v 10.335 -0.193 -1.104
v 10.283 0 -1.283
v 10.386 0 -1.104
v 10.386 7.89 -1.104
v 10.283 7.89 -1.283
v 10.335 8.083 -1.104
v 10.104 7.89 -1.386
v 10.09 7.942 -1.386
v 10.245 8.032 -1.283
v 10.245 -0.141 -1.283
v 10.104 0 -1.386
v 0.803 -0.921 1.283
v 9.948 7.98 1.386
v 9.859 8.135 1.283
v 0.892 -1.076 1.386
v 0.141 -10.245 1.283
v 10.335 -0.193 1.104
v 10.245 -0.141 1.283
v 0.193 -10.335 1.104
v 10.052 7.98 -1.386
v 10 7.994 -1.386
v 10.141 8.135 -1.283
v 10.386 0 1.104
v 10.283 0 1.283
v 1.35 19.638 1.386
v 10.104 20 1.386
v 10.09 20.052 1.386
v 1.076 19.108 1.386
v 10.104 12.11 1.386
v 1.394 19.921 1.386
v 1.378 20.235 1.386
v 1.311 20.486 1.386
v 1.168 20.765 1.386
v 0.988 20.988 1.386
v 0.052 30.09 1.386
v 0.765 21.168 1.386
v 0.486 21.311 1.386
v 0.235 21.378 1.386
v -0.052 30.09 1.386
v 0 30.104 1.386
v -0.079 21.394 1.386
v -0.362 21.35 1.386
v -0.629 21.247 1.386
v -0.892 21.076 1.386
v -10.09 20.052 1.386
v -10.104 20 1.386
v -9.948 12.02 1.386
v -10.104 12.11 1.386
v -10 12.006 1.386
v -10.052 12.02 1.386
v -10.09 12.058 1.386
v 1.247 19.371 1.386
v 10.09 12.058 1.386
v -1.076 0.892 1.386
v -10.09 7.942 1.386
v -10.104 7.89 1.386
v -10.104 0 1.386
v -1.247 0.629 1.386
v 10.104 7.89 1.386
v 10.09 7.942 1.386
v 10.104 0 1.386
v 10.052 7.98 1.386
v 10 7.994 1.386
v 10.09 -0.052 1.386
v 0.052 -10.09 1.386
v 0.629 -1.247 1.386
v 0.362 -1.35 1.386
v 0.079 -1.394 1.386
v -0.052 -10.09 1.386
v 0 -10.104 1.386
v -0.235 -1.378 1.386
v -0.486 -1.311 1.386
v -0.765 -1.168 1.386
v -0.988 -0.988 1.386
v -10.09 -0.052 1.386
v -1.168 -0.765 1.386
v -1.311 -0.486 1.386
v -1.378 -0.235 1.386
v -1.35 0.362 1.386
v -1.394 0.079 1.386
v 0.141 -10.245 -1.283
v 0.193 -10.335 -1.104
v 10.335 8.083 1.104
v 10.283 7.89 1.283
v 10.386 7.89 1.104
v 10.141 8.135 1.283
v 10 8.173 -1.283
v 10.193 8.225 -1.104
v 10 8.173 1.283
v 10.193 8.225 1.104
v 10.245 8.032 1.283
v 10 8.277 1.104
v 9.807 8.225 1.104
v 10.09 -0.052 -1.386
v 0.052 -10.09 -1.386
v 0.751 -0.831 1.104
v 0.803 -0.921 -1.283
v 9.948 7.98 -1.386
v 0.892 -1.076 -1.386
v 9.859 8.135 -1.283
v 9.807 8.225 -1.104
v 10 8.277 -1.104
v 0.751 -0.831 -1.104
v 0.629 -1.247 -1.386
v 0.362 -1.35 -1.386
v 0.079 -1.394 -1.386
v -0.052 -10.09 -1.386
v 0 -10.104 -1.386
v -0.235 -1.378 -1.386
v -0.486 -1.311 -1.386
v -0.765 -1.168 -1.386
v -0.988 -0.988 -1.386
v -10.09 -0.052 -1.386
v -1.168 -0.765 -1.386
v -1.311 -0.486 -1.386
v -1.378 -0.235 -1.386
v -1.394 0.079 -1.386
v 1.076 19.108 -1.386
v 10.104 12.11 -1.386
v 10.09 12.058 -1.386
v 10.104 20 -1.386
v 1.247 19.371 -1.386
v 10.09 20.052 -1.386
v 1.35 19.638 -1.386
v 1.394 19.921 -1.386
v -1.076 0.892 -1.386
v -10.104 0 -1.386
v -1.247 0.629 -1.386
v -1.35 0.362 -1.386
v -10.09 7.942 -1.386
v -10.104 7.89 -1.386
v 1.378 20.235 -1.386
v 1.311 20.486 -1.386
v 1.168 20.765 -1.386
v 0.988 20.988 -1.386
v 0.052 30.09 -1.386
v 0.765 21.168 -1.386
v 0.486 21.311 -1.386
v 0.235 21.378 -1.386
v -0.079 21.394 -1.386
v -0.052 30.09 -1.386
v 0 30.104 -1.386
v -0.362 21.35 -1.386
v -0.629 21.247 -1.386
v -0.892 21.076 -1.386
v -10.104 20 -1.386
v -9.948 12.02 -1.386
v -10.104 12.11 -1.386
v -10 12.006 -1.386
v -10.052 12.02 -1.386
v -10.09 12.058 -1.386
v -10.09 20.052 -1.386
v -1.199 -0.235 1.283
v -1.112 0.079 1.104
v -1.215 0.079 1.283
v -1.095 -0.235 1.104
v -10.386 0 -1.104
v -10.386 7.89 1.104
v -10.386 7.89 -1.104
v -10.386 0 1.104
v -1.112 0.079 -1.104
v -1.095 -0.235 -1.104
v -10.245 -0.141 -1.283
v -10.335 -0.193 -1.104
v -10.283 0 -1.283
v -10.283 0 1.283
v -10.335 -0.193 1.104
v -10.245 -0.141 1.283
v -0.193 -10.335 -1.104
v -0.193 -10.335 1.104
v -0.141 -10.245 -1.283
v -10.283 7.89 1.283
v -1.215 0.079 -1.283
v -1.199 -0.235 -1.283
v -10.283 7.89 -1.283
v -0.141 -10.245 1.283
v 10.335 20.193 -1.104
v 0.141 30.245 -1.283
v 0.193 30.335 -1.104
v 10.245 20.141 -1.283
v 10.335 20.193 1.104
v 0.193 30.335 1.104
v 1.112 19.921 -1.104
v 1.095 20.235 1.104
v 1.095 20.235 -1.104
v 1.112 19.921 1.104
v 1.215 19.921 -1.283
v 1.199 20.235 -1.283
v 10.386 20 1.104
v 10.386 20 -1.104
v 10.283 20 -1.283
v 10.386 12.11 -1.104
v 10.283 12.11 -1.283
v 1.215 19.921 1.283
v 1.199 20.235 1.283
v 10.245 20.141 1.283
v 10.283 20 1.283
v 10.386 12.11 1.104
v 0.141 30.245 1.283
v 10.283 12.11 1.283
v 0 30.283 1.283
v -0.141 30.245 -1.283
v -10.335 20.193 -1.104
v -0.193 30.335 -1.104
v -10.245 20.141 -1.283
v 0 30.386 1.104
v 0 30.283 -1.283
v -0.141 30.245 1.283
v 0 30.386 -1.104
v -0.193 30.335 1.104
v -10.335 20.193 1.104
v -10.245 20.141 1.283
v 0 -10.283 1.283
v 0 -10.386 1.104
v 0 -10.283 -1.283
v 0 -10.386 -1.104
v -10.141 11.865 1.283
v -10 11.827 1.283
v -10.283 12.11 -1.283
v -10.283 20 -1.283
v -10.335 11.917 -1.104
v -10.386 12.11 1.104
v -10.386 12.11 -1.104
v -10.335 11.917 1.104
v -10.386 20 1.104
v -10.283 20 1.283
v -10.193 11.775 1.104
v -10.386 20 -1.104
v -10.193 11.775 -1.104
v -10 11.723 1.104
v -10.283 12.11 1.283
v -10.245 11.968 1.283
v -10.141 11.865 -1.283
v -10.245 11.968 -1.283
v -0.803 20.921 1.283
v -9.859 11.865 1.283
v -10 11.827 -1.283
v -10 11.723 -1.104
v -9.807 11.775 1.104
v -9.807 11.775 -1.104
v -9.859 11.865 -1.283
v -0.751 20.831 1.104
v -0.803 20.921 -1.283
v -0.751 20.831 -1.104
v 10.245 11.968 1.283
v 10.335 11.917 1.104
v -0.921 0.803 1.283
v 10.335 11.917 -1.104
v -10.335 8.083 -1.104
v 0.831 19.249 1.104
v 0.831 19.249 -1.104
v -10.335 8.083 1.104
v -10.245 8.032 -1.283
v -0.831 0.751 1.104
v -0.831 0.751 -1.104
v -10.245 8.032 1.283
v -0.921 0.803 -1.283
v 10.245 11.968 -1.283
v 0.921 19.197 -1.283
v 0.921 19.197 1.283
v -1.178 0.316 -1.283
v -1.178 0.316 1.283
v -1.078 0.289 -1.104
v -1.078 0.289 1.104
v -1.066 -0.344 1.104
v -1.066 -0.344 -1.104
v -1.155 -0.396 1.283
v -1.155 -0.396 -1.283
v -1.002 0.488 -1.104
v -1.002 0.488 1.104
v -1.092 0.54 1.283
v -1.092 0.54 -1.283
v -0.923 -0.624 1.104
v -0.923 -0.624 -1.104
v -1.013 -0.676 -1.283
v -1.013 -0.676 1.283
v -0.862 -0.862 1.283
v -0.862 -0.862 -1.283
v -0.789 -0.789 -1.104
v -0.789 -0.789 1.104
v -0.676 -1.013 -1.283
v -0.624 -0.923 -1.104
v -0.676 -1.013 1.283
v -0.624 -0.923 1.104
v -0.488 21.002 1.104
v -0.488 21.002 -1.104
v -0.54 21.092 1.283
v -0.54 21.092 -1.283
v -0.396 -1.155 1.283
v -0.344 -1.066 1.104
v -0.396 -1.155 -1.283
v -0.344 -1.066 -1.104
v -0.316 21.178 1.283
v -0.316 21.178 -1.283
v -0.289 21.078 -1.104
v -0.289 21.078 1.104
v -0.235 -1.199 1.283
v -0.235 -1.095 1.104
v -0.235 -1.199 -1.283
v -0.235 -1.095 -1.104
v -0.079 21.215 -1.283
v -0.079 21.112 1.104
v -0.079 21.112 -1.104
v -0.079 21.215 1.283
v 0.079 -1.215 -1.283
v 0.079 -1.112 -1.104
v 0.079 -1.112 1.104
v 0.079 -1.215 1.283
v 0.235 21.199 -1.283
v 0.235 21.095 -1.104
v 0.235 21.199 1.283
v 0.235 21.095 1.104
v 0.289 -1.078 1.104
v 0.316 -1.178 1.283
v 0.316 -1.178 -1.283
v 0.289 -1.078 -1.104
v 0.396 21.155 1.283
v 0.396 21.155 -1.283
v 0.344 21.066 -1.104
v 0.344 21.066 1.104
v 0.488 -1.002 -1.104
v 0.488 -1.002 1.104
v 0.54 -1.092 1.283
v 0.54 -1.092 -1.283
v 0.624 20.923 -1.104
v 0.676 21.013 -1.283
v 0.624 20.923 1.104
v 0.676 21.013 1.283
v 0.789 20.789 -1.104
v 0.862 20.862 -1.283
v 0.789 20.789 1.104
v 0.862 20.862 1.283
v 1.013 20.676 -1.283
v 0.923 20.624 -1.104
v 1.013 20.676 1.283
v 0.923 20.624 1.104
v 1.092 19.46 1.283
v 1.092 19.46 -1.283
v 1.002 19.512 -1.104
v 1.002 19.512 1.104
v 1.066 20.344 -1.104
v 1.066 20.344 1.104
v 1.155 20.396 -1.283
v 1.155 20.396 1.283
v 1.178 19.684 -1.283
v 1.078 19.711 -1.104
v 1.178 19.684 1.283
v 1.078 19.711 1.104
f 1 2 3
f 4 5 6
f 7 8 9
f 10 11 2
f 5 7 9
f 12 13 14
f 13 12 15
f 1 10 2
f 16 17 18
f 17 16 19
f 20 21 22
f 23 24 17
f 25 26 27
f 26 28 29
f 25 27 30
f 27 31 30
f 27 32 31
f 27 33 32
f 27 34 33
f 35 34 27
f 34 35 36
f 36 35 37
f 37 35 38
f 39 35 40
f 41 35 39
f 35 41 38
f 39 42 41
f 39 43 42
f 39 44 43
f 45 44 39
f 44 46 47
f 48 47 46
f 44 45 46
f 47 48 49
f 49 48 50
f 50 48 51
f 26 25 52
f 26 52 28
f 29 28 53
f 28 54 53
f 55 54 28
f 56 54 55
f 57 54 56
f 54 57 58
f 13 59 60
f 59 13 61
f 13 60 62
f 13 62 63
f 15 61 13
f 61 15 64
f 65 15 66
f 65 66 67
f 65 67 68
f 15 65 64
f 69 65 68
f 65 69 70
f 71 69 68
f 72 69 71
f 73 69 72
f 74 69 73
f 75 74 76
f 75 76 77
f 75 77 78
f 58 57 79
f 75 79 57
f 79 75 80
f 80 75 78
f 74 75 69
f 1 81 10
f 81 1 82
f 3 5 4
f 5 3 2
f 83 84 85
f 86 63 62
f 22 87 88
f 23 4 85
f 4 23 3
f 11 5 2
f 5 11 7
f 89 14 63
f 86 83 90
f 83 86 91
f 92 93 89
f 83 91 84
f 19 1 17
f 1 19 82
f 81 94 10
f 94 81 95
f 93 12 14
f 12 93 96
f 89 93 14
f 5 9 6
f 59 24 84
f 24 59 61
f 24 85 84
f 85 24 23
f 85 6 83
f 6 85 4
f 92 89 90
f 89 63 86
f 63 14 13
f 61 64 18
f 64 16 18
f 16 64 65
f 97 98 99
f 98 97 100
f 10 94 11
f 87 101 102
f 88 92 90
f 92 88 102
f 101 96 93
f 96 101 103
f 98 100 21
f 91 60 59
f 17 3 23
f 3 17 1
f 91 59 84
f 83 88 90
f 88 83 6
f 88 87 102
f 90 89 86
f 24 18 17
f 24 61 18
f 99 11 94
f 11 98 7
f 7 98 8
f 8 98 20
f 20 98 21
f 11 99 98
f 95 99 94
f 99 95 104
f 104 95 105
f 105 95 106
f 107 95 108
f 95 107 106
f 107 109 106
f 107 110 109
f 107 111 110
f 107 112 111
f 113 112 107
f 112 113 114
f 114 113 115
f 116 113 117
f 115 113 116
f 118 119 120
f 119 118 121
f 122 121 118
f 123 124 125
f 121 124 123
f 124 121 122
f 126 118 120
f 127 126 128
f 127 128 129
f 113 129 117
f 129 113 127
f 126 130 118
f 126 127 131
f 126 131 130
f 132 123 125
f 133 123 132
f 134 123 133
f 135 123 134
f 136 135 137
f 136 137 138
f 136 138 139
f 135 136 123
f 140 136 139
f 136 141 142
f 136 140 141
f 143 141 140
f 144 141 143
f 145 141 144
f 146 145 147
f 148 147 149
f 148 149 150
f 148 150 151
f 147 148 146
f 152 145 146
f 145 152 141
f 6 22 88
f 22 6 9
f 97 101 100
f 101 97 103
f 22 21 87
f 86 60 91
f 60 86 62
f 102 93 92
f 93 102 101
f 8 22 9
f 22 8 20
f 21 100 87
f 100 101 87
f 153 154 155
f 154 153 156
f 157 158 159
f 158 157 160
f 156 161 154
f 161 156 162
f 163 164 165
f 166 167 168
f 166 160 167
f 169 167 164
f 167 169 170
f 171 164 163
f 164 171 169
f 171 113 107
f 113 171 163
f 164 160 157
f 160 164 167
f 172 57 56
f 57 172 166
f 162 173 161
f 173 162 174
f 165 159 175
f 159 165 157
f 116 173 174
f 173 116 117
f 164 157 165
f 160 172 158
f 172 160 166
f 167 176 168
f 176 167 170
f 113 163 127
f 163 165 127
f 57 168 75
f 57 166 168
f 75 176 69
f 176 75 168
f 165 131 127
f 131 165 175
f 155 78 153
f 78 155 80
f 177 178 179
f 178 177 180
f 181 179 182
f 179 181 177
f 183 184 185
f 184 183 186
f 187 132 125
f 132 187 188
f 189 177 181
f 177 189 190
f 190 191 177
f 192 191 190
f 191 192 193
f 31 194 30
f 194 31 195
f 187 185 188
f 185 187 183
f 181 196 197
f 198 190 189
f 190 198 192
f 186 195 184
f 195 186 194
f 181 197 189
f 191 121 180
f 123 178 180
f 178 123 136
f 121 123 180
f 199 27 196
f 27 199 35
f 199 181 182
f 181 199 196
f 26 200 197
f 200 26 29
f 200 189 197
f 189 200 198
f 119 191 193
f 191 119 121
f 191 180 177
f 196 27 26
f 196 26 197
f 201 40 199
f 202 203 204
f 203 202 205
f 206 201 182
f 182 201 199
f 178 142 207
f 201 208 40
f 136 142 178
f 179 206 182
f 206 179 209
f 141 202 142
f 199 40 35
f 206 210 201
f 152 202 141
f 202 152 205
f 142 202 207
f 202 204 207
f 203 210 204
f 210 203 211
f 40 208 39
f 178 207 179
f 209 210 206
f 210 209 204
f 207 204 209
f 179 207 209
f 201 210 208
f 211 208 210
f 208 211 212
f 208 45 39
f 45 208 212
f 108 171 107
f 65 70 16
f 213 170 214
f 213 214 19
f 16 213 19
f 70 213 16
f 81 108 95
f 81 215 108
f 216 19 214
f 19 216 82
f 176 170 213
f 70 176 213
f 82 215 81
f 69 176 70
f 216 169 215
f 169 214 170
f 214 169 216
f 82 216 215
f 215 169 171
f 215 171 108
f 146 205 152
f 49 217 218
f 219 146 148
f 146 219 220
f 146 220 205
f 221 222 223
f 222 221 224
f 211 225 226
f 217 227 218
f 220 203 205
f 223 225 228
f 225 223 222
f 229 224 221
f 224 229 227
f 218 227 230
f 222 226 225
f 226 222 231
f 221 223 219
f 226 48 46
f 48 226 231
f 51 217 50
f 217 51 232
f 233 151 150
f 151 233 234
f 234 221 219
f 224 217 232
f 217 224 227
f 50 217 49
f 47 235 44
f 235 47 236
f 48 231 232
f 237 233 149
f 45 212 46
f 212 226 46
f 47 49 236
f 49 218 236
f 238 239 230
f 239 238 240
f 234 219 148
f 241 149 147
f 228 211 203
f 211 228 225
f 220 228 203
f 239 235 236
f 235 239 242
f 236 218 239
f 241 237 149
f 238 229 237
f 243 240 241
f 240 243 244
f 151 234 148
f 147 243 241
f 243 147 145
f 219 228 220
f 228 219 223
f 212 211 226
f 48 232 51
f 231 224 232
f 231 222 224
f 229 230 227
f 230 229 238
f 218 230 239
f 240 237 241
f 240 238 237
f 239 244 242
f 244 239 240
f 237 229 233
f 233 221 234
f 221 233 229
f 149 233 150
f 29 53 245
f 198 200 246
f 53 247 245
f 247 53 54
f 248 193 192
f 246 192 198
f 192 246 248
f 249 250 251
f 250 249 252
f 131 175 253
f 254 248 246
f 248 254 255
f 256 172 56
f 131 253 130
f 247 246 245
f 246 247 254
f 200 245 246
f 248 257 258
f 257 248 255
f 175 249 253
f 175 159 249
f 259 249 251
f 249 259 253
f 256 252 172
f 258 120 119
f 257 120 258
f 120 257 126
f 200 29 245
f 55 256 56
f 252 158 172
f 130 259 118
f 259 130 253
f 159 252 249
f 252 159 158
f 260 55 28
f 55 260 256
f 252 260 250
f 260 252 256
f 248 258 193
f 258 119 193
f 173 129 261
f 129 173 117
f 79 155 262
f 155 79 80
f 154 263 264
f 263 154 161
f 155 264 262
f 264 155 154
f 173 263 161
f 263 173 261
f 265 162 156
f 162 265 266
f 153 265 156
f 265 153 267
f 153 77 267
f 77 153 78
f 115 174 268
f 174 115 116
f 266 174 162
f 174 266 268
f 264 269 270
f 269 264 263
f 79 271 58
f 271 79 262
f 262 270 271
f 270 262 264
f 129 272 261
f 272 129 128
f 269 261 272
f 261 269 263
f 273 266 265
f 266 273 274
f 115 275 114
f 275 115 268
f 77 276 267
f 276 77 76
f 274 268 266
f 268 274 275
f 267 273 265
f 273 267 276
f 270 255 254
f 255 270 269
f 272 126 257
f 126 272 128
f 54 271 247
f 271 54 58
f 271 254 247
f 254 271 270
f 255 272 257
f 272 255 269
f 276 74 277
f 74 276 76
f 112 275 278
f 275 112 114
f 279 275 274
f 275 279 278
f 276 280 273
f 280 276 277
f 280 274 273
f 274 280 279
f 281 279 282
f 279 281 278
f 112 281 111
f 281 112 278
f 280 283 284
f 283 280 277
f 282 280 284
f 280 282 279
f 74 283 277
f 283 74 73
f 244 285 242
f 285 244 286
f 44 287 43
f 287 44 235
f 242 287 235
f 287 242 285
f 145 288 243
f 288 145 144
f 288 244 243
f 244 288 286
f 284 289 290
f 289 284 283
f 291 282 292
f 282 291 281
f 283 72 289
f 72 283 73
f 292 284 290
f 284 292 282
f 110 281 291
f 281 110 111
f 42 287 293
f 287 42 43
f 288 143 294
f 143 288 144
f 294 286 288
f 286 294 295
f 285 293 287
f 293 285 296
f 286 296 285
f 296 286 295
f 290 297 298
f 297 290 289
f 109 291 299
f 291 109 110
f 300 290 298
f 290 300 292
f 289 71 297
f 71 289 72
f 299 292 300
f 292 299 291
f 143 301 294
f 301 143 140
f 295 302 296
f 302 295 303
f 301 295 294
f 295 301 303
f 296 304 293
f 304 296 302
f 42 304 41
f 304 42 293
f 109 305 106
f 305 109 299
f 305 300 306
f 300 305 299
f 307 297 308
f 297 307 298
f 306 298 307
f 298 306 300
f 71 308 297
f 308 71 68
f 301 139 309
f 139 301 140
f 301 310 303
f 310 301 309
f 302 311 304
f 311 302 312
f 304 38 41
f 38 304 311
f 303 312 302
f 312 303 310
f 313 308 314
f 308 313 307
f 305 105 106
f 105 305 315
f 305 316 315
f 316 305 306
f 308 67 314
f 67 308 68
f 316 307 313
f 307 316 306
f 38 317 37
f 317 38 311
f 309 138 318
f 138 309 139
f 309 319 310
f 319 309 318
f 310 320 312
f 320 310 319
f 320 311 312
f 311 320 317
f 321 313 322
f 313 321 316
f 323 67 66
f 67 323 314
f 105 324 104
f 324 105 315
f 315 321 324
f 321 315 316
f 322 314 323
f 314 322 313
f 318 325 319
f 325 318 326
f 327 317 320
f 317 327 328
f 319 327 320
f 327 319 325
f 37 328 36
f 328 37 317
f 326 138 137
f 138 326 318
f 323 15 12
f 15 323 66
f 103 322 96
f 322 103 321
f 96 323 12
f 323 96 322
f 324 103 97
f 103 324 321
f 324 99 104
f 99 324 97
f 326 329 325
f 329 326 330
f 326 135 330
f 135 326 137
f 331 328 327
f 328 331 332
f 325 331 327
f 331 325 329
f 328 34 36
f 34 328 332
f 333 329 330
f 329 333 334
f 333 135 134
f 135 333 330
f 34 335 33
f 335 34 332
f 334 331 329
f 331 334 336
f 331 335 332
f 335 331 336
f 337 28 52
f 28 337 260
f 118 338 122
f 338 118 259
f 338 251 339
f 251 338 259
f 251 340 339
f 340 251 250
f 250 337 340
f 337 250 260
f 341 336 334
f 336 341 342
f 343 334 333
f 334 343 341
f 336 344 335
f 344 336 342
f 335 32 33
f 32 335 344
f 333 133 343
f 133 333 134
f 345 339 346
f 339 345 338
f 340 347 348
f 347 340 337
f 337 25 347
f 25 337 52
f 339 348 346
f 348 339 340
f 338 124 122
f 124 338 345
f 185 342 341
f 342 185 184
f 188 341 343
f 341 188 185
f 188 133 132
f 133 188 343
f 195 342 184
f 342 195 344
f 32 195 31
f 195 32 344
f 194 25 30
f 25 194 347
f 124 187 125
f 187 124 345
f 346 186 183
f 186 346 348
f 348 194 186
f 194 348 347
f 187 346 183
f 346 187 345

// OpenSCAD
//Units are mm
$fn = 30;

minkowski() 
{
	difference()
	{
		hull()
		{
			cylinder(r = 10, h = 2, center = true, $fn = 4);
			translate([0,20,0]) cylinder(r = 10, h = 2, center = true, $fn = 4);
		}
		union()
		{
			rotate([0, 0, 45]) translate([10, 0, 0]) hull() 
			{ 
				translate([10, 0, 0]) cylinder(r = 1.5, h = 10, center = true);
				translate([-10, 0, 0]) cylinder(r = 1.5, h = 10, center = true);
			}
			translate([0, 20, 0]) rotate([0, 0, 45]) translate([-10, 0, 0]) hull() 
			{ 
				translate([10, 0, 0]) cylinder(r = 1.5, h = 10, center = true);
				translate([-10, 0, 0]) cylinder(r = 1.5, h = 10, center = true);
			}
		}
	}
	sphere(r = 0.4, $fn=12);
}
